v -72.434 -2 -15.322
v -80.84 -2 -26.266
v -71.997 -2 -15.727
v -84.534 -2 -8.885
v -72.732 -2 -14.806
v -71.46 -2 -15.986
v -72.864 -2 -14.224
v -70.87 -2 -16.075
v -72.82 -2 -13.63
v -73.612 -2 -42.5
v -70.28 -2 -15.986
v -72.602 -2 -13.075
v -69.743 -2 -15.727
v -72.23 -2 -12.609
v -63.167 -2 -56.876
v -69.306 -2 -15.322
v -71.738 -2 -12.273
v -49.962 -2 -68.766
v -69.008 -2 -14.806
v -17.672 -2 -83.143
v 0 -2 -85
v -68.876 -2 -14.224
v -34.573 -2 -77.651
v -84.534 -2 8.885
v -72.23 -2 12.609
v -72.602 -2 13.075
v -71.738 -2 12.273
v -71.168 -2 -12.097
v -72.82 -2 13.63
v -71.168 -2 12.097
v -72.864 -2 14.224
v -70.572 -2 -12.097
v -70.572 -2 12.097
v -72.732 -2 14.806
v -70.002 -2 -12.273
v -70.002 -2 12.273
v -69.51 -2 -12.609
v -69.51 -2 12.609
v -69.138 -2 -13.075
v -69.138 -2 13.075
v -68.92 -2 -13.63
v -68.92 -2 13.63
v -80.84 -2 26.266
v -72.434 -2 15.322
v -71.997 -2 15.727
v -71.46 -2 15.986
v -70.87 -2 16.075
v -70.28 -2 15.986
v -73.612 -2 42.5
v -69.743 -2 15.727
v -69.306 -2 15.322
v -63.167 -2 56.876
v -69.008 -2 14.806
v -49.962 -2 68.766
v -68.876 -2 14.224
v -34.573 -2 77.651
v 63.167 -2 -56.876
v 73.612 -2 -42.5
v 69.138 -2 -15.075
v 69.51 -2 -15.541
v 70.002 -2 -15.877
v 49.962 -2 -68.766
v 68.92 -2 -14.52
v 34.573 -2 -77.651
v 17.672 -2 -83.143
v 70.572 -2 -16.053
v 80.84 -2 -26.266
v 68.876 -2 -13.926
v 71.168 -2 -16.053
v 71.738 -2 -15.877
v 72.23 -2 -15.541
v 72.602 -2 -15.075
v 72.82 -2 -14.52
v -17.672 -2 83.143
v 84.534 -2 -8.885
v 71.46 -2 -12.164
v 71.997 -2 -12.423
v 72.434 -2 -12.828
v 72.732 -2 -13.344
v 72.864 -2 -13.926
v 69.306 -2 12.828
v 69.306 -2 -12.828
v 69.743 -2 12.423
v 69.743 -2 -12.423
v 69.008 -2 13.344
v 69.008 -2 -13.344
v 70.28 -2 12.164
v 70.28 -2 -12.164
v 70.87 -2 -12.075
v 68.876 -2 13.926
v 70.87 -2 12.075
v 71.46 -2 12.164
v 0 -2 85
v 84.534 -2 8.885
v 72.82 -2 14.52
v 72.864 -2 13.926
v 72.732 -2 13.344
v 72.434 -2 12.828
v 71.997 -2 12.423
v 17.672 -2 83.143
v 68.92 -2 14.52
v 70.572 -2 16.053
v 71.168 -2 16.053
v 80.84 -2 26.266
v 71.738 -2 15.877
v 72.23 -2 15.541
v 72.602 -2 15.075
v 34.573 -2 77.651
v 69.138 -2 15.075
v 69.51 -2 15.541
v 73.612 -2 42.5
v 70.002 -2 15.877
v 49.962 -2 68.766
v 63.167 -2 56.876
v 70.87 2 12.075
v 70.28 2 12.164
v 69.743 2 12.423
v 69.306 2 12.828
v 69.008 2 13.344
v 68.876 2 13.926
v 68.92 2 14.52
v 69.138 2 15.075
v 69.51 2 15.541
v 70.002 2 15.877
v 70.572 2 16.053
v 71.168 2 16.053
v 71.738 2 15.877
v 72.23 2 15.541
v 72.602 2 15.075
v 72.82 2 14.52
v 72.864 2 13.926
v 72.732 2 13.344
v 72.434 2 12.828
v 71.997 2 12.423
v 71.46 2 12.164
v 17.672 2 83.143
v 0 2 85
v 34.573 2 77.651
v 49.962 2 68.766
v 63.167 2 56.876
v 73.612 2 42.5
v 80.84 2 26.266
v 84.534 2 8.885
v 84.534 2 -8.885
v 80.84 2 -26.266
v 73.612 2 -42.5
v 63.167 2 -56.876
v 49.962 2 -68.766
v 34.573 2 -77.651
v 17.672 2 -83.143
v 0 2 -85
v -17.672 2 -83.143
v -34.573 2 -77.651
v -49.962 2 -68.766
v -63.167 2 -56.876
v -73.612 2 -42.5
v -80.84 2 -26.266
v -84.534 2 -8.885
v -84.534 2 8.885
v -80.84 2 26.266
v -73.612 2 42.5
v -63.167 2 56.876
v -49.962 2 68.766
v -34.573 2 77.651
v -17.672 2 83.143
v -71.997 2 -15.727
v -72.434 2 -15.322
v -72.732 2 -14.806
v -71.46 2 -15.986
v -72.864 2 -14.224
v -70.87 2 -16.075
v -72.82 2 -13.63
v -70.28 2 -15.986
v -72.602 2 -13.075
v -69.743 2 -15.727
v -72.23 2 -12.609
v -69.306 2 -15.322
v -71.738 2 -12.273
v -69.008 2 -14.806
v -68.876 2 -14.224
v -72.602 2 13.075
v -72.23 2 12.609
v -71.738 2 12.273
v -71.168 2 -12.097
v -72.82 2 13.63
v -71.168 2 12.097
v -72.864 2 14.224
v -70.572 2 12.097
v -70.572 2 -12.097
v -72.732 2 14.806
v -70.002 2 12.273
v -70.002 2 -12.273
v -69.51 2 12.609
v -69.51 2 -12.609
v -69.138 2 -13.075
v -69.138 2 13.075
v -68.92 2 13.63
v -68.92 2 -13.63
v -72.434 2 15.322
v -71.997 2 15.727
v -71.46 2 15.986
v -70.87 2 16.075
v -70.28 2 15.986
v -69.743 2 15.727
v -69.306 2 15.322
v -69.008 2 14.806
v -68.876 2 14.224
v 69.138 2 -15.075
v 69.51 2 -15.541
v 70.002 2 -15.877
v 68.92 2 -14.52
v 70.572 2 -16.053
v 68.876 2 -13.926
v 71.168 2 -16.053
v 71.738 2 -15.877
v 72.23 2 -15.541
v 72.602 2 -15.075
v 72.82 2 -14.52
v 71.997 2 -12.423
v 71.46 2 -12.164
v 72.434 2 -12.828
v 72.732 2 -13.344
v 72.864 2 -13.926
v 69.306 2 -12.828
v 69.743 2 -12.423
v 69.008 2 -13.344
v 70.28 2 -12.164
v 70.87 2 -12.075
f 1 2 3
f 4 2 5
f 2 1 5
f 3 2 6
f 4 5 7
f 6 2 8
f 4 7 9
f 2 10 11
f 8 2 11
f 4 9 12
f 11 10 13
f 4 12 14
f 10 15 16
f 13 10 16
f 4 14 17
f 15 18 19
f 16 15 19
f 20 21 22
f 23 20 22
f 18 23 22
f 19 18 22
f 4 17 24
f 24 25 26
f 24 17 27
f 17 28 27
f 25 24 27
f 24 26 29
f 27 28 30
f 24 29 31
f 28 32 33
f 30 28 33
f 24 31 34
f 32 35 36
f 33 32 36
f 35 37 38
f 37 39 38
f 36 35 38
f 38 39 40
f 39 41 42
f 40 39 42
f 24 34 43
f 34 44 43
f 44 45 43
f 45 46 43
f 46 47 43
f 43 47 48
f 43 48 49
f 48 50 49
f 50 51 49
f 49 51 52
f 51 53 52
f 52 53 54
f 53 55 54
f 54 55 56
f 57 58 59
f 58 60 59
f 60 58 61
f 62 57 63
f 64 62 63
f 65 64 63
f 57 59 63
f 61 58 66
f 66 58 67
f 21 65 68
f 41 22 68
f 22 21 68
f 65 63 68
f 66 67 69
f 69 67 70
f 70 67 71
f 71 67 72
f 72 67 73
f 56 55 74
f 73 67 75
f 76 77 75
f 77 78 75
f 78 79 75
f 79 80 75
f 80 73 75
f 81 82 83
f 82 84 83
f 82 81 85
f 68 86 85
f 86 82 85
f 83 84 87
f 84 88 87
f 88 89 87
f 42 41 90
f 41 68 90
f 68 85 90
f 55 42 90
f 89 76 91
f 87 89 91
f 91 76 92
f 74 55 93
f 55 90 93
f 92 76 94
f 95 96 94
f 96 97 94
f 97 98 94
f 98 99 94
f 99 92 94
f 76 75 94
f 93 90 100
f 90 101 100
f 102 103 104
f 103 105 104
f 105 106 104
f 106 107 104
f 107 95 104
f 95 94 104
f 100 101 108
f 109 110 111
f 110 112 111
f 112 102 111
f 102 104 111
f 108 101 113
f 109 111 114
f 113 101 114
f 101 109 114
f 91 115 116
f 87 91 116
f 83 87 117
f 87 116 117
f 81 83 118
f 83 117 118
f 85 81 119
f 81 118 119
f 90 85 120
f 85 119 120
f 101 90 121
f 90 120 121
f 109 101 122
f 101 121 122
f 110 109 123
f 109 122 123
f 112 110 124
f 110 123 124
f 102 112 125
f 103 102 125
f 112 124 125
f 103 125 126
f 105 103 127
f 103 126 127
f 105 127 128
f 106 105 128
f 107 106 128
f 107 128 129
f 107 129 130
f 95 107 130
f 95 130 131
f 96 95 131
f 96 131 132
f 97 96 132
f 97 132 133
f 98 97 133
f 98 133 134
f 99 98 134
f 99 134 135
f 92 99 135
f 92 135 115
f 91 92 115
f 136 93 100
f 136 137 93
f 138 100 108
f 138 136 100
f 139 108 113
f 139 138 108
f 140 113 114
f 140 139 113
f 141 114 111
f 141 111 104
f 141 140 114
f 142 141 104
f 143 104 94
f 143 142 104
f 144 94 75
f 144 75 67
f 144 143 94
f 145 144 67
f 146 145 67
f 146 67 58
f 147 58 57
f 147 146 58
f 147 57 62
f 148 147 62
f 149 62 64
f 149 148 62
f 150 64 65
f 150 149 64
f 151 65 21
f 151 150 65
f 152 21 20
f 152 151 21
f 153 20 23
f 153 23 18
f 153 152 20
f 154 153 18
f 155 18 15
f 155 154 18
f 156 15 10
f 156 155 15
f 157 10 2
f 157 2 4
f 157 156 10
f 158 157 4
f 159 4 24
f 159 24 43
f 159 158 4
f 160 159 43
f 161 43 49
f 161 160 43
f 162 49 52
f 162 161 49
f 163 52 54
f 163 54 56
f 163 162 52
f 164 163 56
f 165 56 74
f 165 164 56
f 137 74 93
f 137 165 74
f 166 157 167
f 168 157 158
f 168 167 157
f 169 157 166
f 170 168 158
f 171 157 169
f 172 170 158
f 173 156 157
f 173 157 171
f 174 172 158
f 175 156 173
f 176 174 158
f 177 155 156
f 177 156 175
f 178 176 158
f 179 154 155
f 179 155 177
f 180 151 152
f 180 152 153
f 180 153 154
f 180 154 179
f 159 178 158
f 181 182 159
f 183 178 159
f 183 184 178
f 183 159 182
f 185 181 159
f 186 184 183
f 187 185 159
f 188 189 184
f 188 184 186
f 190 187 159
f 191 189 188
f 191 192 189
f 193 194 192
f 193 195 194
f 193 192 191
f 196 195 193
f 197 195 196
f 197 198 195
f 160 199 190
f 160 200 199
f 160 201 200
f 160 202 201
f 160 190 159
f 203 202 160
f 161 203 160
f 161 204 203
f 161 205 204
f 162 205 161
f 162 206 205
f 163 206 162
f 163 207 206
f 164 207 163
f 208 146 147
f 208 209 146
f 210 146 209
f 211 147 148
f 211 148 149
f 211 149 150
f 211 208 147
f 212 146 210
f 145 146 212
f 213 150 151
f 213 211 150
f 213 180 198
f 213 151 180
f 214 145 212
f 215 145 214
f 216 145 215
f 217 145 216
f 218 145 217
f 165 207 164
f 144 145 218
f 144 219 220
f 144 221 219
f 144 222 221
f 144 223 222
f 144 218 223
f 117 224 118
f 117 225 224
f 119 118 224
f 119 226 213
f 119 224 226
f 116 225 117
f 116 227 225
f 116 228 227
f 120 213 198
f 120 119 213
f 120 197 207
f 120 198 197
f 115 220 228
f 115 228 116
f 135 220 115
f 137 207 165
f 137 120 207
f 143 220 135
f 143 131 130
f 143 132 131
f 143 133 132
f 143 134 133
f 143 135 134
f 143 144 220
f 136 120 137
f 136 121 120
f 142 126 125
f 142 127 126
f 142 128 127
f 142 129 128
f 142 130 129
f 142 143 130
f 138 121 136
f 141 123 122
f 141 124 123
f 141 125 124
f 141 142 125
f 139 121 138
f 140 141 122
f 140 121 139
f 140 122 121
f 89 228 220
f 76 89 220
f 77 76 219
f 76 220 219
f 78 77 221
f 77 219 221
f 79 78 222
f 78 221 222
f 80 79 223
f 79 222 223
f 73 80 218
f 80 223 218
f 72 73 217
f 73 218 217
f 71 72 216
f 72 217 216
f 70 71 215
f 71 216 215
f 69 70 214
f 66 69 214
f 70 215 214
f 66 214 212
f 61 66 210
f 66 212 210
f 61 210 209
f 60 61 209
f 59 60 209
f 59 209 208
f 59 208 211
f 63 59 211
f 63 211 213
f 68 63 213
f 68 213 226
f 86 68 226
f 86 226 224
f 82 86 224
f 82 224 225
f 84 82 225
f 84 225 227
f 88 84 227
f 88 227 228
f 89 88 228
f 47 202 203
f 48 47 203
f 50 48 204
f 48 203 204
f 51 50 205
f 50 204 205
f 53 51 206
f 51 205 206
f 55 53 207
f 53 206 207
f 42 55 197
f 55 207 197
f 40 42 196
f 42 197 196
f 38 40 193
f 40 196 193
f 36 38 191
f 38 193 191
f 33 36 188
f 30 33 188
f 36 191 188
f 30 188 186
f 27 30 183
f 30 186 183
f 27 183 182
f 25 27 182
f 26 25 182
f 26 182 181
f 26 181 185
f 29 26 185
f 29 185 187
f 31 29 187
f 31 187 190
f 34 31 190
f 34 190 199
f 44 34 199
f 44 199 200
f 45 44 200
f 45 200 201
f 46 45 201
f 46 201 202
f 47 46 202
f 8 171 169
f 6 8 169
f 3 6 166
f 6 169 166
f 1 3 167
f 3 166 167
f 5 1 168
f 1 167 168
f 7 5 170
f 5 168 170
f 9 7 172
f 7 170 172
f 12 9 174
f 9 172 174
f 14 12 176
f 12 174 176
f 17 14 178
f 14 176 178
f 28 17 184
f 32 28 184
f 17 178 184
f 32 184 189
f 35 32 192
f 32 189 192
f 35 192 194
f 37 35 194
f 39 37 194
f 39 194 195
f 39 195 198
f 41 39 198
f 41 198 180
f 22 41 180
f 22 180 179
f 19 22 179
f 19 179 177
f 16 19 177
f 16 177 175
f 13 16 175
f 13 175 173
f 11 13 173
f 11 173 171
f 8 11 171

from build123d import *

# Parameters (mm, degrees)
SKETCH1_R           = 85
BOSS_EXTRUDE1_DEPTH = 2
SKETCH2_R           = 2
CUT_EXTRUDE1_DEPTH  = 121.274685616


with BuildPart() as part:
    # Sketch1 → Boss-Extrude1 (new, symmetric)
    with BuildSketch(Plane(origin=(0, 0, 0), x_dir=(1, 0, 0), z_dir=(0, 1, 0))):
        with Locations(Location((0, 0, 0), (0, 0, 270))):
            Circle(SKETCH1_R)
    extrude(amount=BOSS_EXTRUDE1_DEPTH, both=True)

    # Sketch2 → Cut-Extrude1 (cut, through all)
    with BuildSketch(Plane(origin=(0, 2, 0), x_dir=(1, 0, 0), z_dir=(0, 1, 0))):
        with Locations(Location((70.87, 14.075, 0), (0, 0, 270))):
            Circle(SKETCH2_R)
        with Locations(Location((70.87, -14.075, 0), (0, 0, 90))):
            Circle(SKETCH2_R)
        with Locations(Location((-70.87, -14.075, 0), (0, 0, 270))):
            Circle(SKETCH2_R)
        with Locations(Location((-70.87, 14.075, 0), (0, 0, 90))):
            Circle(SKETCH2_R)
    extrude(amount=-CUT_EXTRUDE1_DEPTH, mode=Mode.SUBTRACT)


solid = part.part
